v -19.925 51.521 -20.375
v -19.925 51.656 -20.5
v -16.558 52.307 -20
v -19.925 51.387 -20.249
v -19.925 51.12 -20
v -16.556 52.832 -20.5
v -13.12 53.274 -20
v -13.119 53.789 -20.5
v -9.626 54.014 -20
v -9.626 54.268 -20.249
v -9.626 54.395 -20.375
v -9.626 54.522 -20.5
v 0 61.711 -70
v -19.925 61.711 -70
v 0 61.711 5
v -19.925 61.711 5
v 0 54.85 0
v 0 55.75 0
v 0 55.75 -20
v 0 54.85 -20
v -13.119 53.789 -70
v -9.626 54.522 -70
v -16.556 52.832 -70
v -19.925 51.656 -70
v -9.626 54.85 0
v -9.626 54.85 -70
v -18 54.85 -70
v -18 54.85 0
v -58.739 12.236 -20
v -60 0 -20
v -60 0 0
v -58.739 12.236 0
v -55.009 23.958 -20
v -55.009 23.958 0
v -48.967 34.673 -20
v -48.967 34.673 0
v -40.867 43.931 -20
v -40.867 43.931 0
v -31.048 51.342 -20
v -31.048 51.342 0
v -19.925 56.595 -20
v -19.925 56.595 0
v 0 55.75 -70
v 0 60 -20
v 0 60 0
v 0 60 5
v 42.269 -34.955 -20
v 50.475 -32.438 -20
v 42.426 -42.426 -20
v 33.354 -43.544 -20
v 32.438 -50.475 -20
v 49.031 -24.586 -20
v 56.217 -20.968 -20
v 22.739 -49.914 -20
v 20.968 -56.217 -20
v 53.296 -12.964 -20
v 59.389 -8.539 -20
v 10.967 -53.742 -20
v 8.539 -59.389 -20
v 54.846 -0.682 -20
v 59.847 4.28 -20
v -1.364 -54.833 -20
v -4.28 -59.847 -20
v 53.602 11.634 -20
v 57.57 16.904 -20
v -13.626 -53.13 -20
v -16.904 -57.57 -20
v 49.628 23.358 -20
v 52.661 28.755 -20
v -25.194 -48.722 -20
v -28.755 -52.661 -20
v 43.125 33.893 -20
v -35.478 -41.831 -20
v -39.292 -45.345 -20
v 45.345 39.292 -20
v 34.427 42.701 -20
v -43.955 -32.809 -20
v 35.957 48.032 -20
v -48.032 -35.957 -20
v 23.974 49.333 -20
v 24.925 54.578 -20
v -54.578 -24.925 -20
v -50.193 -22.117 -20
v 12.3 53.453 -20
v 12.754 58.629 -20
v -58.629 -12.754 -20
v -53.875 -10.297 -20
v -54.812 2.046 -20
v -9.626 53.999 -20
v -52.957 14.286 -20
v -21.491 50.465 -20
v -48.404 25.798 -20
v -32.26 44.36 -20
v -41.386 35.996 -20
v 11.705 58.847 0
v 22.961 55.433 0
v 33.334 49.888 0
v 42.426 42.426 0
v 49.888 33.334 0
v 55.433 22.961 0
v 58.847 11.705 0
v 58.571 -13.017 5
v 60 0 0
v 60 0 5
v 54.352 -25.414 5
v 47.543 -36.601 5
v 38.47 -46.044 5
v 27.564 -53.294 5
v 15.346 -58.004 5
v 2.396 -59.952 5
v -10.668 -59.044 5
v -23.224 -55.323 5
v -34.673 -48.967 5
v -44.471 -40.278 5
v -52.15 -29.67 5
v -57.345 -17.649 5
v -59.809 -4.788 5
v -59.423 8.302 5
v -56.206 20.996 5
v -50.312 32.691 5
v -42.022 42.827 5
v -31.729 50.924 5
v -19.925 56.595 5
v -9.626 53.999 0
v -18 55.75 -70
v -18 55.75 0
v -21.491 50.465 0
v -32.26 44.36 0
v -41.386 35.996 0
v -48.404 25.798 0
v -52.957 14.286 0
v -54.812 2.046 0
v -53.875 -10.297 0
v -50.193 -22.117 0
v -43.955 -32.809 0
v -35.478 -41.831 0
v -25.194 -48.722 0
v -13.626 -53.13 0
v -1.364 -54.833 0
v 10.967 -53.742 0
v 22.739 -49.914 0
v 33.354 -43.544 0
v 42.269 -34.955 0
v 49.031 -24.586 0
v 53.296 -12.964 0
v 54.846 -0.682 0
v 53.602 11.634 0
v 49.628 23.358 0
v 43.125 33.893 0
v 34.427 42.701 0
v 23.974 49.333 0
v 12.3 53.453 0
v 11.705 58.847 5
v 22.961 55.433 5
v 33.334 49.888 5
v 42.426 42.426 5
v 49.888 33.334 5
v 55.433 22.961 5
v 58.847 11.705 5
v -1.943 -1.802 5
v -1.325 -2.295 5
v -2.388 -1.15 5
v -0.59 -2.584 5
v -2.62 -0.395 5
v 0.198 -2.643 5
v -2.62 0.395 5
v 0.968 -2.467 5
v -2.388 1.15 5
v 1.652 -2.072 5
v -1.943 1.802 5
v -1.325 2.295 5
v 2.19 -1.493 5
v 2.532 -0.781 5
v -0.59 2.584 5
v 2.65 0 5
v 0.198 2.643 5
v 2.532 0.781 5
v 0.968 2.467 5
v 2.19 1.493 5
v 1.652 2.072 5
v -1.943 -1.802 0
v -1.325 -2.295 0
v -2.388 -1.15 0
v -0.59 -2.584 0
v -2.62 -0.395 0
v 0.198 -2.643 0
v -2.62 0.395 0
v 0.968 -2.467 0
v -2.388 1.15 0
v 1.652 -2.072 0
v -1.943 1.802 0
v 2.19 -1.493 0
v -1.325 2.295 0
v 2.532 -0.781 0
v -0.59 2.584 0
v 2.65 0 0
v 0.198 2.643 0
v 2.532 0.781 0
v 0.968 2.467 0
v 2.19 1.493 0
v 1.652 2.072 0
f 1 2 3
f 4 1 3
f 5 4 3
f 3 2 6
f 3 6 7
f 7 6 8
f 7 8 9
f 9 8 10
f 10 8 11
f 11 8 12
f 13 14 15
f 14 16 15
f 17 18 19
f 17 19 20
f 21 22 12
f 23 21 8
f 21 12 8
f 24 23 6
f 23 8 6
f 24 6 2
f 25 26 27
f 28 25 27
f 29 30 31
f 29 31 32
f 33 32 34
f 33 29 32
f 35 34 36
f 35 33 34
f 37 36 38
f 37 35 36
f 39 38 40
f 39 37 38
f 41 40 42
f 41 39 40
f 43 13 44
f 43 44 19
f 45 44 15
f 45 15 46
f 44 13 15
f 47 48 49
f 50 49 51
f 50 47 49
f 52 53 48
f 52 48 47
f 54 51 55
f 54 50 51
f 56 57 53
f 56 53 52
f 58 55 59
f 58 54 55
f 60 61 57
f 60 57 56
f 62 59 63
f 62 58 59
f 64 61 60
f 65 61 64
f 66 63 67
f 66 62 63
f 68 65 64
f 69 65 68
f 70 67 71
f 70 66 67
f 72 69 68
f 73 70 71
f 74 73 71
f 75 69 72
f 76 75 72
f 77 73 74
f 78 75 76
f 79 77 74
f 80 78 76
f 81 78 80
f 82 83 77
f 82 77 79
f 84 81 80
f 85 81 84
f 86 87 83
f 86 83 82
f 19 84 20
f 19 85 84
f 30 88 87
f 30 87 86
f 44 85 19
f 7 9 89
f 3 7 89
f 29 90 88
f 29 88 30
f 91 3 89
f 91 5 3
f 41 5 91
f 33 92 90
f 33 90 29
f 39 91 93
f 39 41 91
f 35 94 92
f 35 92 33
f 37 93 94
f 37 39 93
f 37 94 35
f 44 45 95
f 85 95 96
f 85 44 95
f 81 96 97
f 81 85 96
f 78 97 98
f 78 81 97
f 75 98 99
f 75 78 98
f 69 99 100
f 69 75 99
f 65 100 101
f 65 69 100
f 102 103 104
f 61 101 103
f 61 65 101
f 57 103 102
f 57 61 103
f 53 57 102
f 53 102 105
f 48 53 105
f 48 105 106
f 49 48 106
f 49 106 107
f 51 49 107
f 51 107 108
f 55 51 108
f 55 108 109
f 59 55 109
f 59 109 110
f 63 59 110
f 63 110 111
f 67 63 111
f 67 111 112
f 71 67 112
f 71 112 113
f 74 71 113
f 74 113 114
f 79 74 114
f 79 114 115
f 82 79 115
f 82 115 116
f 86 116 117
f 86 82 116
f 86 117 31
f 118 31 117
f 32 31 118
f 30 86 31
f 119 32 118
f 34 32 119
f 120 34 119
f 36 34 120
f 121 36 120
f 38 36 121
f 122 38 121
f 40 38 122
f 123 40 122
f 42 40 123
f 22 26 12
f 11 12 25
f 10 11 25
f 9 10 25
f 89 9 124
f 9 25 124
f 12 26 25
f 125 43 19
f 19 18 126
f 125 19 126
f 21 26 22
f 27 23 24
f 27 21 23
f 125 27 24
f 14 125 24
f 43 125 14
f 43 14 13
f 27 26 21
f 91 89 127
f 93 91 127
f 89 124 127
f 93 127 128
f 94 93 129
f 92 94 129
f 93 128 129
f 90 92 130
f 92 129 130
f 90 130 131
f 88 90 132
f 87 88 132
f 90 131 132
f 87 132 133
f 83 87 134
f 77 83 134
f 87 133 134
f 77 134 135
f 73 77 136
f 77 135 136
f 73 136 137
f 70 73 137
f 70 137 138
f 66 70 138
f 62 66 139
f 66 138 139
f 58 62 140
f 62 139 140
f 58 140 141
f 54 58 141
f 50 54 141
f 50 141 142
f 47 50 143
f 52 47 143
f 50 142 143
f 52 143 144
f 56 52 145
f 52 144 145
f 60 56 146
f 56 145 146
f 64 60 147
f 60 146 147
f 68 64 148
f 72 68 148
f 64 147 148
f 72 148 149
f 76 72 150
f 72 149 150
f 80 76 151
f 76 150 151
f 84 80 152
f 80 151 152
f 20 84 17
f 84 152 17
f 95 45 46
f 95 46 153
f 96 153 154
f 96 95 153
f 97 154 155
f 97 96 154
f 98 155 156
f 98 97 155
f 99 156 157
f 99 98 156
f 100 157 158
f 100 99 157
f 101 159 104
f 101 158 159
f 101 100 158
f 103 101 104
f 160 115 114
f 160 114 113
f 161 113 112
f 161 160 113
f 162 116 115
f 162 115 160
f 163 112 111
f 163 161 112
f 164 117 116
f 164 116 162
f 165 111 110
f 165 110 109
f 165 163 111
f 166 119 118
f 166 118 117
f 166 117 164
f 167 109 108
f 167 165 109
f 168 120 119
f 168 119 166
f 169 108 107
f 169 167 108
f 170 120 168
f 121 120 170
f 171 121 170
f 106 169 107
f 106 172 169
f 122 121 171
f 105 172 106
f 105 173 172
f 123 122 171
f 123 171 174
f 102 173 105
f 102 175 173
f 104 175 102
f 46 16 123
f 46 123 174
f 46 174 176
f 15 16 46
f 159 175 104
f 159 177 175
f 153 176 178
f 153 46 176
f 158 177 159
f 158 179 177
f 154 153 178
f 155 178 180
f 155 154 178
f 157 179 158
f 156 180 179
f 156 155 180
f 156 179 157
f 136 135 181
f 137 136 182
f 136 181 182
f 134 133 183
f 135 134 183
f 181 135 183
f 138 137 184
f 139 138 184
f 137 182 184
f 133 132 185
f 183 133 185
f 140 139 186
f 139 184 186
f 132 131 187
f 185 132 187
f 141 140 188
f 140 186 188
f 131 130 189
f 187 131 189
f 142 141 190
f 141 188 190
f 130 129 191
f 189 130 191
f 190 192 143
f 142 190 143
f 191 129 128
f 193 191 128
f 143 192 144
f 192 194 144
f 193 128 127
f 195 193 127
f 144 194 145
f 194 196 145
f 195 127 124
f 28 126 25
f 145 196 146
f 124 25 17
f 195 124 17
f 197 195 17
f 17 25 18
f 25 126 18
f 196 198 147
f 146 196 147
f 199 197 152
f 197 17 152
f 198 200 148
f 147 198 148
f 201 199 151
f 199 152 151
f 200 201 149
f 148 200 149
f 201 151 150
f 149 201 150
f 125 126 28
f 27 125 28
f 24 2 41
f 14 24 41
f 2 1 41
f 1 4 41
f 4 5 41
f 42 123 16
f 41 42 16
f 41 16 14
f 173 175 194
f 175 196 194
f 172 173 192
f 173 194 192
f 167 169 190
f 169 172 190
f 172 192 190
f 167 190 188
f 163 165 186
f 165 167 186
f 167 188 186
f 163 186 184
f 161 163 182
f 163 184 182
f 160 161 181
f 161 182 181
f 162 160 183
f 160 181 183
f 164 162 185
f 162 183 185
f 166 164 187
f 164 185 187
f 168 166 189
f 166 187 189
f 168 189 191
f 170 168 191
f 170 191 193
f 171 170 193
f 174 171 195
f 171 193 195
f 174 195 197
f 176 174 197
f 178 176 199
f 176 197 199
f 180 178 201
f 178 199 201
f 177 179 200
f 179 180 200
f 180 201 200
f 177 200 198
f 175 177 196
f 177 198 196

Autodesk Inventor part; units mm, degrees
ref_plane "YZ Plane" through (0, 0, 0) normal (1, 0, 0) x (0, 1, 0)
ref_plane "XZ Plane" through (0, 0, 0) normal (0, 1, 0) x (-1, 0, 0)
ref_plane "XY Plane" through (0, 0, 0) normal (0, 0, 1) x (1, 0, 0)
sketch "Sketch1" plane through (0, 0, 0) normal (0, 0, 1) x (1, 0, 0)
  circle A0 centre (0, 0) radius 60
  circle A1 centre (0, 0) radius 2.65
  dimension "d0" = 120
  dimension "d1" = 5.3
extrude "Extrusion1" add sketch "Sketch1" along normal blind 5
sketch "Sketch4" plane through (0, 0, 0) normal (0, 0, -1) x (-1, 0, 0)
  circle A0 centre (0, 0) radius 2.65 projected
  circle A1 centre (0, 0) radius 54.85
  circle A2 centre (0, 0) radius 60
  dimension "d13" = 109.7
  dimension "d14" = 120
extrude "Extrusion4" add sketch "Sketch4" along normal blind 20 contours A2
sketch "Sketch7" plane through (0, 0, -20) normal (0, 0, -1) x (-1, 0, 0)
  circle A0 centre (0, 0) radius 54.85 projected
  line L0 (0, 54.85) -> (30.5637, 54.85)
  line L1 (30.5637, 54.85) -> (30.5637, 55.75)
  line L2 (30.5637, 55.75) -> (0, 55.75)
  line L3 (0, 55.75) -> (0, 54.85)
  line L4 (18, 55.75) -> (18, 54.85)
  line L5 (4.9967, 54.85) -> (4.9967, 54.185)
  line L6 (4.9967, 54.185) -> (0, 54.85)
  dimension "d25" = 0.9
extrude "Extrusion7" cut sketch "Sketch7" against normal blind 20 contours L0 L5 A0 | L3 L2 L4 L0 | A0 L5 L6 picked at (2.2214, 54.6199)
sketch "Sketch8" plane through (0, 0, -20) normal (0, 0, -1) x (-1, 0, 0)
  arc A0 (0, 54.85) -> (4.9967, 54.6219) centre (0, 0) ccw projected
  line L0 (19.9252, 51.1029) -> (19.9252, 61.7106)
  line L1 (19.9252, 61.7106) -> (0, 61.7106)
  line L2 (0, 55.75) -> (18, 55.75) projected
  line L3 (0, 61.7106) -> (0, 55.75)
  line L4 (0, 55.75) -> (18, 55.75)
  line L5 (18, 55.75) -> (18, 54.85) projected
  line L6 (18, 55.75) -> (18, 54.85)
  line L7 (18, 54.85) -> (4.9967, 54.85)
  line L8 (4.9967, 54.85) -> (4.9967, 54.6219) projected
  line L9 (4.9967, 54.85) -> (4.9967, 54.6219)
  line L10 (18, 54.85) -> (4.9967, 54.85) projected
  line L11 (7.5379, 54.85) -> (7.5379, 54.3296)
  arc A1 (19.9685, 51.6391) -> (7.5379, 54.85) centre (0, 0) ccw
  line L12 (9.6264, 54.85) -> (9.6264, 54.5222)
  point P0 (19.9252, 51.6559)
extrude "Extrusion8" add sketch "Sketch8" along normal blind 50 and the other way blind 25 contours A1 L12 L7 L5 L2 L3 L1 L0
chamfer "Chamfer1" distance 0.5 angle 45 1 edges at (-14.8452, 53.3382, -20)
sketch "Sketch9" plane through (0, 0, -20) normal (0, 0, -1) x (-1, 0, 0)
  line L0 (9.6264, 54.0144) -> (9.6264, 54.85) projected
  line L1 (9.6264, 54.85) -> (4.9967, 54.85) projected
  line L2 (9.6264, 54.85) -> (4.9967, 54.85)
  line L3 (4.9967, 54.85) -> (4.9967, 54.6219) projected
  line L4 (4.9967, 54.85) -> (4.9967, 54.6219)
  line L5 (4.9967, 54.6219) -> (4.9967, 54.2488)
  line L6 (4.9967, 54.2488) -> (9.6264, 53.9987)
  arc A0 (0, 54.85) -> (4.9967, 54.6219) centre (0, 0) ccw projected
  line L7 (9.6264, 54.85) -> (9.6264, 53.9987)
extrude "Extrusion9" cut sketch "Sketch9" against normal blind 20
properties part number "Disc"
